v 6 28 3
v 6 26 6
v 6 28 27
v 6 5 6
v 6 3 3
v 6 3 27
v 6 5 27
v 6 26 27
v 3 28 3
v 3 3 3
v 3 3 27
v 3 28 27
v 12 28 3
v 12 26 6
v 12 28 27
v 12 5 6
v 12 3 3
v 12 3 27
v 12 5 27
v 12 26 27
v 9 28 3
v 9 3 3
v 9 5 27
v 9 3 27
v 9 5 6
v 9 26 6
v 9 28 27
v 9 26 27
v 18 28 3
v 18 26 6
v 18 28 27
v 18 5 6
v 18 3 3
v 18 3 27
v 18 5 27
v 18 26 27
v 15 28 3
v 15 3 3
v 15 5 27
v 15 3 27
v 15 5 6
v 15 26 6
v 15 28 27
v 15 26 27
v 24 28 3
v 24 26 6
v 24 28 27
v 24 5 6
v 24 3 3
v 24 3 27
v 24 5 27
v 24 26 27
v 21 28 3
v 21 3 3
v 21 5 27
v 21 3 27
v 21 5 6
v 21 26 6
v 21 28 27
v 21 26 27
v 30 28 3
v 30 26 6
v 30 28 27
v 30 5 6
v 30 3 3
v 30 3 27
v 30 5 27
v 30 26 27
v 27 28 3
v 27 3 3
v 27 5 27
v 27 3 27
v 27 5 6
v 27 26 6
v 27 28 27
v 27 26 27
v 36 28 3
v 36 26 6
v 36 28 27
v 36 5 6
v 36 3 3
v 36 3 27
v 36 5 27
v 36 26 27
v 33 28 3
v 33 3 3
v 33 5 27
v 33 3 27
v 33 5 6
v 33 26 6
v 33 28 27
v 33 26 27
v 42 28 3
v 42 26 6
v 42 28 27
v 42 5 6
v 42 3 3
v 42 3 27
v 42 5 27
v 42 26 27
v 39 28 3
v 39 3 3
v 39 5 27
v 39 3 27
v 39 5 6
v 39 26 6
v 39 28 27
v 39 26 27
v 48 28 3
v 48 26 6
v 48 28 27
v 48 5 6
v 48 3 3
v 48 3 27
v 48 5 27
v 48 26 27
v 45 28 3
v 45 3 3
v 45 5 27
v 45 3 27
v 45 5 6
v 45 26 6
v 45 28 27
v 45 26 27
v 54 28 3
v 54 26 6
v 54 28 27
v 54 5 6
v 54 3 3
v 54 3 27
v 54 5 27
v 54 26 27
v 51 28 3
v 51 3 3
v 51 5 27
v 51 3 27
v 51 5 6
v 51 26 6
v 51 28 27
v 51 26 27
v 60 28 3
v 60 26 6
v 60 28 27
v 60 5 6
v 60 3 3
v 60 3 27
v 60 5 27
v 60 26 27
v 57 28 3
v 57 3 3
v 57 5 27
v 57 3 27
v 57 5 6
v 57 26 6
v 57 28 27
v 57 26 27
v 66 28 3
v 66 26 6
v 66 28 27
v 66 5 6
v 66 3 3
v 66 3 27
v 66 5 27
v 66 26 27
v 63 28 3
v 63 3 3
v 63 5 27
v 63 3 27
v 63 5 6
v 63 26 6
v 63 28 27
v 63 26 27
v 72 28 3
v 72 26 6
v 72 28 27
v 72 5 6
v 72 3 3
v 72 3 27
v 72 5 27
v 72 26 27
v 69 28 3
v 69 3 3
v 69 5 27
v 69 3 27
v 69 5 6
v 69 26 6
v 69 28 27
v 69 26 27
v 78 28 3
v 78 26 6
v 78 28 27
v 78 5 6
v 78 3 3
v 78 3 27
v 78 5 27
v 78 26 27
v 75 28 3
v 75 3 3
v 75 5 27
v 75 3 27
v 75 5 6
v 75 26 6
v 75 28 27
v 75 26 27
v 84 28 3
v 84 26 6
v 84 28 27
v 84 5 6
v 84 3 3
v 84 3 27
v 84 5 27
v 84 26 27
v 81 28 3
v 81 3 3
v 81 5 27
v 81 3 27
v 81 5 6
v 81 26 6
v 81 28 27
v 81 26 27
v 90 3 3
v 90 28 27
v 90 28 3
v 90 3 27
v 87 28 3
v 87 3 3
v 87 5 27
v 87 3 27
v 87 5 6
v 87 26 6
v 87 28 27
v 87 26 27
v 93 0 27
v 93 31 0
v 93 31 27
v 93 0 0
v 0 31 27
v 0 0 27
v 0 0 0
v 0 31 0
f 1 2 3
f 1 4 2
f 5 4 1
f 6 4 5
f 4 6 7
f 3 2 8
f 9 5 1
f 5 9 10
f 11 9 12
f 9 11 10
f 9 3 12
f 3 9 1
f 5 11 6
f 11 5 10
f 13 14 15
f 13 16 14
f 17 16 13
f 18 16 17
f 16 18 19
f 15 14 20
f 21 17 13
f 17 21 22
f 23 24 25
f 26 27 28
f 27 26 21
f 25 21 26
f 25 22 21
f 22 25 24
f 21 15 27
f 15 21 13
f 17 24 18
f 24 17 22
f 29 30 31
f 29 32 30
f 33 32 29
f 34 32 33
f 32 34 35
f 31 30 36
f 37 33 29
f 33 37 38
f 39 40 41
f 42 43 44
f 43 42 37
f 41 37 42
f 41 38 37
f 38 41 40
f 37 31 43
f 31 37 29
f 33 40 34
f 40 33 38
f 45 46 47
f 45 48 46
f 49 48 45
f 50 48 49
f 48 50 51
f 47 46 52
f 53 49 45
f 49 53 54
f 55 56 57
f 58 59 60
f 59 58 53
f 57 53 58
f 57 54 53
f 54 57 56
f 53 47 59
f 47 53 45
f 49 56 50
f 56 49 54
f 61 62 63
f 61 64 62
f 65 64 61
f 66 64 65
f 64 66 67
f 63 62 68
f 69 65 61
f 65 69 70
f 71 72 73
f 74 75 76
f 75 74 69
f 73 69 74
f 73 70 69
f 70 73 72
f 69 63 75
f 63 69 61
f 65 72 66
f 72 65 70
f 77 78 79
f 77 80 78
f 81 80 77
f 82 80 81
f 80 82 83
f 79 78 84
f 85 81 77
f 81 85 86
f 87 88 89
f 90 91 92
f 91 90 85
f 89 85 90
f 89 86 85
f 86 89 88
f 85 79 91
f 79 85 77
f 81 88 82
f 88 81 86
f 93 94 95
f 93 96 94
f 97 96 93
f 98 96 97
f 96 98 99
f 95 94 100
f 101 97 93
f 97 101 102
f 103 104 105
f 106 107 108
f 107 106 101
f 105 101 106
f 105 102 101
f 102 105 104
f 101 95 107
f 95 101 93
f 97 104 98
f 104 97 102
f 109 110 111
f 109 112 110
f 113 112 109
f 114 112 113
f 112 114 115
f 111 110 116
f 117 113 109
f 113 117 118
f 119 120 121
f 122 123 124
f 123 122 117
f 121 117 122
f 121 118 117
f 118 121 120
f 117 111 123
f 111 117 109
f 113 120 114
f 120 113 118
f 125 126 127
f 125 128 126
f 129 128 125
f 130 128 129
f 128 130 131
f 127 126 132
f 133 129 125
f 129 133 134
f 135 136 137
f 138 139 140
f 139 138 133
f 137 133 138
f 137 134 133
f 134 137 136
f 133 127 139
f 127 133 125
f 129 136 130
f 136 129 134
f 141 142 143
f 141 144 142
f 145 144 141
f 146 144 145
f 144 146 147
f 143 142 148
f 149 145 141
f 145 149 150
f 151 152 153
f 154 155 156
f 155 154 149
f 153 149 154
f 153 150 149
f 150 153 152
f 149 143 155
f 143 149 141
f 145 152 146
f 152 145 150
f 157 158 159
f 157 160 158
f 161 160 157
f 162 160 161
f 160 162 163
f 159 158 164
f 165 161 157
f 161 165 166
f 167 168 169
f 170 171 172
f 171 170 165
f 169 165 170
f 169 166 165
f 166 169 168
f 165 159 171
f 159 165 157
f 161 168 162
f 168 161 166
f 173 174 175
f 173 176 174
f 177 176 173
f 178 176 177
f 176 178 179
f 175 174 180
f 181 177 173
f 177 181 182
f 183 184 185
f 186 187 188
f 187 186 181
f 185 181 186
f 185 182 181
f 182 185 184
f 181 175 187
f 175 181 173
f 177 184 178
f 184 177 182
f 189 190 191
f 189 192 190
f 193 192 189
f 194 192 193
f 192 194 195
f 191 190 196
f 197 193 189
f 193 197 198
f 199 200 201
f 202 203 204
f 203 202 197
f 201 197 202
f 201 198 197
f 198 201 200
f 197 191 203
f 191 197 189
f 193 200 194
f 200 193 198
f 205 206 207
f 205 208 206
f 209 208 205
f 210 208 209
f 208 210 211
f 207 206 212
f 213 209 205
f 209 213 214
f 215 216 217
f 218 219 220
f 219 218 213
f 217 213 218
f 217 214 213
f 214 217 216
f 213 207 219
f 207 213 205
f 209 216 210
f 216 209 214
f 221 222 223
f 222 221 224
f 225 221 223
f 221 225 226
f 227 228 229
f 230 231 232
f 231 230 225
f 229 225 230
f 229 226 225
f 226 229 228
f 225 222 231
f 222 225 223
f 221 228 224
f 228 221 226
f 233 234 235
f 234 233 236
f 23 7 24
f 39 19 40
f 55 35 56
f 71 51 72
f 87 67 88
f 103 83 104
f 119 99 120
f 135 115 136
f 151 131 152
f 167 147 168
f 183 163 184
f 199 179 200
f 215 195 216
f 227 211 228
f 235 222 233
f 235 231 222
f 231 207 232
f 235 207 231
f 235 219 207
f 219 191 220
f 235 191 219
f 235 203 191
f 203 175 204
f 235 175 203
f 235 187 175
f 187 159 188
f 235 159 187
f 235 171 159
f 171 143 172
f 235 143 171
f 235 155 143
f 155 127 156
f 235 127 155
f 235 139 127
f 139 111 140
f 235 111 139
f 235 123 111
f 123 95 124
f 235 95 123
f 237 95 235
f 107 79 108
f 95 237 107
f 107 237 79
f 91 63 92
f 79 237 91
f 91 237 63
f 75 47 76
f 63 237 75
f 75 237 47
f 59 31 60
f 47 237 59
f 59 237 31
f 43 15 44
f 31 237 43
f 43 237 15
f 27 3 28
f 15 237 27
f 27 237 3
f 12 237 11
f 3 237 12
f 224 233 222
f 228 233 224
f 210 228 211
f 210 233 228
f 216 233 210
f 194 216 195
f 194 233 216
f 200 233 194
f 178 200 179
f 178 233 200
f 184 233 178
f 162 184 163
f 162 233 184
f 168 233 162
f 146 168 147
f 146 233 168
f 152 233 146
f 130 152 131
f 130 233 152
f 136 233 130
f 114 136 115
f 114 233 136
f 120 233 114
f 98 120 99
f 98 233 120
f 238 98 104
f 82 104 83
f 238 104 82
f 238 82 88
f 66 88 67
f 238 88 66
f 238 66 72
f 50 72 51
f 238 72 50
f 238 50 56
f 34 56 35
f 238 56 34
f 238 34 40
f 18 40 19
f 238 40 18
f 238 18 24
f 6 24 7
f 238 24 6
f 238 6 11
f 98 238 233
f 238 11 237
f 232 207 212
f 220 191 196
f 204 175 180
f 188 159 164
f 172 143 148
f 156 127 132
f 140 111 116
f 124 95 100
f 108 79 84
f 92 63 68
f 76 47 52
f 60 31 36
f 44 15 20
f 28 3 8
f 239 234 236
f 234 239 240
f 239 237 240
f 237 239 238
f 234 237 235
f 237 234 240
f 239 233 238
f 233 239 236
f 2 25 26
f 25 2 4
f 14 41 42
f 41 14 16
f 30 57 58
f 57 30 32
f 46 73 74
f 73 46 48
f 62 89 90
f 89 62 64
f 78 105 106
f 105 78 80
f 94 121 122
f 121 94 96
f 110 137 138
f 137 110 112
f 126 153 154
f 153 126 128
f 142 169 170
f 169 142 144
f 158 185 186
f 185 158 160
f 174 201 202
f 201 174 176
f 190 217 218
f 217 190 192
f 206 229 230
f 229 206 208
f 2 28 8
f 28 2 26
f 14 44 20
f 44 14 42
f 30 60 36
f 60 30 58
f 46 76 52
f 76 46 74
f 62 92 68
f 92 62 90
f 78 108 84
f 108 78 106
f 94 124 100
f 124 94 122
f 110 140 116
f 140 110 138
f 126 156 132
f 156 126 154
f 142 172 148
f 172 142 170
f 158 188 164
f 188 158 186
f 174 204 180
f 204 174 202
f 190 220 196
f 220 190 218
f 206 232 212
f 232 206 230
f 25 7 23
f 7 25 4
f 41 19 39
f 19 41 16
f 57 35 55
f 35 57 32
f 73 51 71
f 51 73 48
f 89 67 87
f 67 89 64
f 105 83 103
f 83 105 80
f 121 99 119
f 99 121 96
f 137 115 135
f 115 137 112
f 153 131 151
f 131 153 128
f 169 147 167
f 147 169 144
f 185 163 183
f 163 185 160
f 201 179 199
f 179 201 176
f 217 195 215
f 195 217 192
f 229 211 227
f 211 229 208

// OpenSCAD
/*[Settings]*/
//Amount of SD-Card slots you want ?
Amount = 15; // [5:1:30]

/*[Extra]*/
// How do you want the sides ?
Sides = "Closed" ; // [Open,Closed,Halfway,Qaurter]

// do you want stackable boxes ?
StackableOnSide = "None" ; // [Left,Right,Both,None]

Device_Lenght = Amount*6+3;

difference () {
    translate ([0,0,0]) cube ([Device_Lenght,31,27]);
    translate ([-1,5,6]) cube ([Device_Lenght+1,21,27]);
    for (a =[3:6:Device_Lenght]){translate ([a,3,3]) cube ([3,25,32]);}
}

if (Sides == "Closed") {
    translate ([0,0,0]) cube ([3,31,27]);
    translate ([Device_Lenght-3,0,0]) cube ([3,31,27]);
}
if (Sides == "Qaurter") {
    translate ([0,0,0]) cube ([3,31,20]);
    translate ([Device_Lenght-3,0,0]) cube ([3,31,20]);
}
if (Sides == "Halfway") {
    translate ([0,0,0]) cube ([3,31,13]);
    translate ([Device_Lenght-3,0,0]) cube ([3,31,13]);
}

if (StackableOnSide == "Left") {
    difference () {
        translate ([0,31,0]) cube ([Device_Lenght,3,25]);
        for (a =[5:20:Device_Lenght]){translate ([a-0.10,31,0]) cube ([3.20,3,25]);}
    }
}
if (StackableOnSide == "Right") {
    for (a =[5:20:Device_Lenght]){translate ([a,-3,0]) cube ([3,3,25]);}    
}
if (StackableOnSide == "Both") {
    difference () {
        translate ([0,31,0]) cube ([Device_Lenght,3,25]);
        for (a =[5:20:Device_Lenght]){translate ([a-0.10,31,0]) cube ([3.20,3,25]);}
    }
    for (a =[5:20:Device_Lenght]){translate ([a,-3,0]) cube ([3,3,25]);}    
}
